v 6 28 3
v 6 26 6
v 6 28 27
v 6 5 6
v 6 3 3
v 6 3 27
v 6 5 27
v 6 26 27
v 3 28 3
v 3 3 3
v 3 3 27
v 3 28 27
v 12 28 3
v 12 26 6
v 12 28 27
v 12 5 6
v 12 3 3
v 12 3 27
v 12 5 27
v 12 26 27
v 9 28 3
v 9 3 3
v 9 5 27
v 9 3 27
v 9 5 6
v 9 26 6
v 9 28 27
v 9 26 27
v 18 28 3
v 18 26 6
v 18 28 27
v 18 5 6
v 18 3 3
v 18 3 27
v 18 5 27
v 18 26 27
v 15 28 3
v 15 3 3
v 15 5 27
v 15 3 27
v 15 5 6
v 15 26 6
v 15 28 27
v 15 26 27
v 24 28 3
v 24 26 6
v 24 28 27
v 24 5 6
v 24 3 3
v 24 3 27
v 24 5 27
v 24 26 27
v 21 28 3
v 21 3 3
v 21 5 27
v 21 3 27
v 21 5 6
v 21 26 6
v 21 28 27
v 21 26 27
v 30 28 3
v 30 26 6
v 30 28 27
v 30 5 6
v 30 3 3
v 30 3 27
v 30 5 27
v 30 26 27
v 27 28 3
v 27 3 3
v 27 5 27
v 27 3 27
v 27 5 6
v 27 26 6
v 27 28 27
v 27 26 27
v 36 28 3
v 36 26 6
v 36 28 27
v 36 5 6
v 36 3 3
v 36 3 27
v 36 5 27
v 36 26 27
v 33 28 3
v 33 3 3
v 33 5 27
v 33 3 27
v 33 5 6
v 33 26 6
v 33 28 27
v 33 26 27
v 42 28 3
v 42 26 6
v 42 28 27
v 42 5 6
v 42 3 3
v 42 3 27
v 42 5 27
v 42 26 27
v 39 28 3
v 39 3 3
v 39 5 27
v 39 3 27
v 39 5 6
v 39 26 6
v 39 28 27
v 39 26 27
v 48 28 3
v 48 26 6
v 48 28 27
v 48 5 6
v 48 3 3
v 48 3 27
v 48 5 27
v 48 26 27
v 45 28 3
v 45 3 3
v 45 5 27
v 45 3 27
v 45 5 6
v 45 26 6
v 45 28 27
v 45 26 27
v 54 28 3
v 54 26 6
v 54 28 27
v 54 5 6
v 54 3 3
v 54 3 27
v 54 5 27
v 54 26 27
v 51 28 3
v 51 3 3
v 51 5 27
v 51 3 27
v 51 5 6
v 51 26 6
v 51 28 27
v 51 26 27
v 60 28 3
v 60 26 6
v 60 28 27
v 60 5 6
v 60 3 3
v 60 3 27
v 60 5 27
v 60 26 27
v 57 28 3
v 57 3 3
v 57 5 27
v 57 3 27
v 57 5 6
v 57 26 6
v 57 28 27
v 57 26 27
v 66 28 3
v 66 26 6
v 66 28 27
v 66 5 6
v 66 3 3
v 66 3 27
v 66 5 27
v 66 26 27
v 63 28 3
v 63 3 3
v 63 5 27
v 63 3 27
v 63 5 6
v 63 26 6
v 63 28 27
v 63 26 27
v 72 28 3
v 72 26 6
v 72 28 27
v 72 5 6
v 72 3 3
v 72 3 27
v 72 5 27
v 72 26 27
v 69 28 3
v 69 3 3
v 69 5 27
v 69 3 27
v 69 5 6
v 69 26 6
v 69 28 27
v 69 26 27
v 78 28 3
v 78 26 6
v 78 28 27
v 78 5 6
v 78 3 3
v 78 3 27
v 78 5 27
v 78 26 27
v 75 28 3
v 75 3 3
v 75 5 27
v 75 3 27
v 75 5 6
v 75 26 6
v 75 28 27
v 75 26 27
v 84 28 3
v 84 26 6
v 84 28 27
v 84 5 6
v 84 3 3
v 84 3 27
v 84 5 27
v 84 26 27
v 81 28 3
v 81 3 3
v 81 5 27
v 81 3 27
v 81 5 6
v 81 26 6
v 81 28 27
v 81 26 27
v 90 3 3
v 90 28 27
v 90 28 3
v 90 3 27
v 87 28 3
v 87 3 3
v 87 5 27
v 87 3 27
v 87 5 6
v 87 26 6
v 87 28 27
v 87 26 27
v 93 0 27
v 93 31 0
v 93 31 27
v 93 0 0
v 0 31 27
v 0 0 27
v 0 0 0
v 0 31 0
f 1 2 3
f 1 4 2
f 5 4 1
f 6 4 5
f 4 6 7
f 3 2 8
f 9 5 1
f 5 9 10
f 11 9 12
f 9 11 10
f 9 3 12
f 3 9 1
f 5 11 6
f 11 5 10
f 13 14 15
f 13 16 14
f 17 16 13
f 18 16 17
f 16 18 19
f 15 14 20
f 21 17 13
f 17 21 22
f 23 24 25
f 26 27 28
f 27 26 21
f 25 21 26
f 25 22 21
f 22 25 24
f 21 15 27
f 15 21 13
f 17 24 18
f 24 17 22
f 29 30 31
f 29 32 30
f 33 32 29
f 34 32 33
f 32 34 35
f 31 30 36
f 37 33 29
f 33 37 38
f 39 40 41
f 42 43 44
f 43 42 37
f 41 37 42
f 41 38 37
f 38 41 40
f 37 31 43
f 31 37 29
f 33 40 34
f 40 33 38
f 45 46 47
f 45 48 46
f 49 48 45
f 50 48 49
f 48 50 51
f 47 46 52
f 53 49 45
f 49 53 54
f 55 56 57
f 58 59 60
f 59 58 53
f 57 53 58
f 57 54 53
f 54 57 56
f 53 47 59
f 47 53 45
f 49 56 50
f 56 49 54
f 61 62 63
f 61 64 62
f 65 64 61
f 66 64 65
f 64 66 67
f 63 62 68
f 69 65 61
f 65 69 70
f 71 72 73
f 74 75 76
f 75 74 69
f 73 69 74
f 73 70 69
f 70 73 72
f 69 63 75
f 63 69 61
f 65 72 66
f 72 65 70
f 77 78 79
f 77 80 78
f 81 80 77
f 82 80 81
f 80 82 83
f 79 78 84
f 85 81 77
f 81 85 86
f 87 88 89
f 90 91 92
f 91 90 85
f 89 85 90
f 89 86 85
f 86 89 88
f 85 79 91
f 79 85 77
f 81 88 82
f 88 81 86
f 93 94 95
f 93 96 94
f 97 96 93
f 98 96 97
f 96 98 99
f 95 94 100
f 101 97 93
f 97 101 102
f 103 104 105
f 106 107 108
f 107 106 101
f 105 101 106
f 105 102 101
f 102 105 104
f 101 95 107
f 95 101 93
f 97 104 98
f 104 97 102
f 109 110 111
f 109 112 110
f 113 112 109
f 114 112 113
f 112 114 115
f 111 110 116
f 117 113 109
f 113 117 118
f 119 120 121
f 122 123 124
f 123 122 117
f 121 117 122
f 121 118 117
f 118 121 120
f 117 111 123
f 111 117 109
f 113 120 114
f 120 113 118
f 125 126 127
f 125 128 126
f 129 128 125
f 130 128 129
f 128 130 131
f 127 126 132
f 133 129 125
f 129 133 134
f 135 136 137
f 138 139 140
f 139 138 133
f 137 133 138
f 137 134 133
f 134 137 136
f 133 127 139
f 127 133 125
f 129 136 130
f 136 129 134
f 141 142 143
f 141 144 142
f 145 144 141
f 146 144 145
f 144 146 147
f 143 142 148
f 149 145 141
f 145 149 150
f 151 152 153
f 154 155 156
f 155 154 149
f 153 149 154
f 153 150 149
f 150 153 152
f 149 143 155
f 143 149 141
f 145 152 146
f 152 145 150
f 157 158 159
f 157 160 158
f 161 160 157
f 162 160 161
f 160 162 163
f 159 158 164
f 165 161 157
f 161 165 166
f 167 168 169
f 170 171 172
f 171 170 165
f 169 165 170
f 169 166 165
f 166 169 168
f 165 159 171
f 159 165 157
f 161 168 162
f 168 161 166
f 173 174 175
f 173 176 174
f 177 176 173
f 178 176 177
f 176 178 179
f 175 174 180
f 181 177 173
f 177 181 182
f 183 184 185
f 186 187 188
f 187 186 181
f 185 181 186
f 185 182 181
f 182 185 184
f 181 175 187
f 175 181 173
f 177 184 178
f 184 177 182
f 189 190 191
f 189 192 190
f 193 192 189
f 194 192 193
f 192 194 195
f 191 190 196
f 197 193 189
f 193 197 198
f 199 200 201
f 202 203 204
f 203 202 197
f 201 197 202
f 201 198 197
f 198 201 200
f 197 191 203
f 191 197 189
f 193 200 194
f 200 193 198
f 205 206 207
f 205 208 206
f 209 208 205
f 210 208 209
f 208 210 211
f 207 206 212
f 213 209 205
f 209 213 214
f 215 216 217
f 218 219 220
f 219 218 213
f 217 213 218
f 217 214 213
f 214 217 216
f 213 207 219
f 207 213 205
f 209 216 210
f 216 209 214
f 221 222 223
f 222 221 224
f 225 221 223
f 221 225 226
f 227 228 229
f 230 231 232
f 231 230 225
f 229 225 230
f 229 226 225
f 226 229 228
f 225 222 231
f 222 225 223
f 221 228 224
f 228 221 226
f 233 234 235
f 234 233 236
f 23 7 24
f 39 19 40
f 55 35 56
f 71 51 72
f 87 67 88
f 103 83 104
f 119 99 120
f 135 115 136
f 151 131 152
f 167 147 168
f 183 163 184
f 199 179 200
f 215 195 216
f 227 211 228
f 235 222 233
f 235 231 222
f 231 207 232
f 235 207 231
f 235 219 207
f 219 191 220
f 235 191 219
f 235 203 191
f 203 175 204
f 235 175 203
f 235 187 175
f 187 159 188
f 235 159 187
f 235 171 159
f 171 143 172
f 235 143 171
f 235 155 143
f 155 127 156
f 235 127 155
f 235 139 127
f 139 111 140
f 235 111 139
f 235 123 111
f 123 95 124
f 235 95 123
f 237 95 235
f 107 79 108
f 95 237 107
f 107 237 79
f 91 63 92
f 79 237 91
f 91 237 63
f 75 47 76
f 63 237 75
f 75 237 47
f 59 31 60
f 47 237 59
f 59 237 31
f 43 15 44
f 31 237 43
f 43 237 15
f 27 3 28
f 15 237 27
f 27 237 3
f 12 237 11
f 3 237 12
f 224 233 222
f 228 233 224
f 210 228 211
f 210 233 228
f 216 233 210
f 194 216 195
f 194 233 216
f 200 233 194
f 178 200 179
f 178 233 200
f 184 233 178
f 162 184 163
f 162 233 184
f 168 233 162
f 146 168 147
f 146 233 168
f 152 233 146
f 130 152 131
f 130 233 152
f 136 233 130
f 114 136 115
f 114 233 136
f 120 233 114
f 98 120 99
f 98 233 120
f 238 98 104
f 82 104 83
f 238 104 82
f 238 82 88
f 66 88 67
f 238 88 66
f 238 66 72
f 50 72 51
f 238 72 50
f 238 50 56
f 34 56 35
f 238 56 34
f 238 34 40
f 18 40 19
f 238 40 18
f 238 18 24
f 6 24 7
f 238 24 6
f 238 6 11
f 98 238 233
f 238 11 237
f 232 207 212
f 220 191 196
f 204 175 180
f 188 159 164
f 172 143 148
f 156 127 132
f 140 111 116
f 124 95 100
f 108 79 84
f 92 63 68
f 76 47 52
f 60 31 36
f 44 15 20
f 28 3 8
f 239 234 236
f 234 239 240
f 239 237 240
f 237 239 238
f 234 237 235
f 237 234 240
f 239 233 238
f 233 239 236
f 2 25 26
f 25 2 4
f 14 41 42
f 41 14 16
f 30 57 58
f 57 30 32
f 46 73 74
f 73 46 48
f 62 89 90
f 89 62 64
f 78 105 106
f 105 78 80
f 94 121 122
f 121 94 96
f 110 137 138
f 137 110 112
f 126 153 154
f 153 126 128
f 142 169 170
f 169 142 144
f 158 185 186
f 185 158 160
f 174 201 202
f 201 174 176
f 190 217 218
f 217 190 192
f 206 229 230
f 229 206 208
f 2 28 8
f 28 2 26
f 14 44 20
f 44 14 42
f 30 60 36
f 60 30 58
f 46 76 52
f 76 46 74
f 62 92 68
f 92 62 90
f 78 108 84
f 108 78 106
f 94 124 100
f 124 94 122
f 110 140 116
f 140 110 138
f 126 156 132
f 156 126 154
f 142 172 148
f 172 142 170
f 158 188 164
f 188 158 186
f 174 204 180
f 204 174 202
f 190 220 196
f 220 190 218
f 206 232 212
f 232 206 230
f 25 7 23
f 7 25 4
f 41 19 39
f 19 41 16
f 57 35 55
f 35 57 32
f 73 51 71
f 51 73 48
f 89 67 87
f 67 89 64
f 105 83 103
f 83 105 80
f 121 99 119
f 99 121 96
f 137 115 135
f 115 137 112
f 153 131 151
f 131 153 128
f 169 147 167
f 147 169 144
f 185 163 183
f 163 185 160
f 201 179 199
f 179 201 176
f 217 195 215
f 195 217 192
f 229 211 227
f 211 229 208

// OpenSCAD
/*[Settings]*/
//Amount of SD-Card slots you want ?
Amount = 15; // [5:1:30]

/*[Extra]*/
// How do you want the sides ?
Sides = "Closed" ; // [Open,Closed,Halfway,Qaurter]

// do you want stackable boxes ?
StackableOnSide = "None" ; // [Left,Right,Both,None]

Device_Lenght = Amount*6+3;

difference () {
    translate ([0,0,0]) cube ([Device_Lenght,31,27]);
    translate ([-1,5,6]) cube ([Device_Lenght+1,21,27]);
    for (a =[3:6:Device_Lenght]){translate ([a,3,3]) cube ([3,25,32]);}
}

if (Sides == "Closed") {
    translate ([0,0,0]) cube ([3,31,27]);
    translate ([Device_Lenght-3,0,0]) cube ([3,31,27]);
}
if (Sides == "Qaurter") {
    translate ([0,0,0]) cube ([3,31,20]);
    translate ([Device_Lenght-3,0,0]) cube ([3,31,20]);
}
if (Sides == "Halfway") {
    translate ([0,0,0]) cube ([3,31,13]);
    translate ([Device_Lenght-3,0,0]) cube ([3,31,13]);
}

if (StackableOnSide == "Left") {
    difference () {
        translate ([0,31,0]) cube ([Device_Lenght,3,25]);
        for (a =[5:20:Device_Lenght]){translate ([a-0.10,31,0]) cube ([3.20,3,25]);}
    }
}
if (StackableOnSide == "Right") {
    for (a =[5:20:Device_Lenght]){translate ([a,-3,0]) cube ([3,3,25]);}    
}
if (StackableOnSide == "Both") {
    difference () {
        translate ([0,31,0]) cube ([Device_Lenght,3,25]);
        for (a =[5:20:Device_Lenght]){translate ([a-0.10,31,0]) cube ([3.20,3,25]);}
    }
    for (a =[5:20:Device_Lenght]){translate ([a,-3,0]) cube ([3,3,25]);}    
}
